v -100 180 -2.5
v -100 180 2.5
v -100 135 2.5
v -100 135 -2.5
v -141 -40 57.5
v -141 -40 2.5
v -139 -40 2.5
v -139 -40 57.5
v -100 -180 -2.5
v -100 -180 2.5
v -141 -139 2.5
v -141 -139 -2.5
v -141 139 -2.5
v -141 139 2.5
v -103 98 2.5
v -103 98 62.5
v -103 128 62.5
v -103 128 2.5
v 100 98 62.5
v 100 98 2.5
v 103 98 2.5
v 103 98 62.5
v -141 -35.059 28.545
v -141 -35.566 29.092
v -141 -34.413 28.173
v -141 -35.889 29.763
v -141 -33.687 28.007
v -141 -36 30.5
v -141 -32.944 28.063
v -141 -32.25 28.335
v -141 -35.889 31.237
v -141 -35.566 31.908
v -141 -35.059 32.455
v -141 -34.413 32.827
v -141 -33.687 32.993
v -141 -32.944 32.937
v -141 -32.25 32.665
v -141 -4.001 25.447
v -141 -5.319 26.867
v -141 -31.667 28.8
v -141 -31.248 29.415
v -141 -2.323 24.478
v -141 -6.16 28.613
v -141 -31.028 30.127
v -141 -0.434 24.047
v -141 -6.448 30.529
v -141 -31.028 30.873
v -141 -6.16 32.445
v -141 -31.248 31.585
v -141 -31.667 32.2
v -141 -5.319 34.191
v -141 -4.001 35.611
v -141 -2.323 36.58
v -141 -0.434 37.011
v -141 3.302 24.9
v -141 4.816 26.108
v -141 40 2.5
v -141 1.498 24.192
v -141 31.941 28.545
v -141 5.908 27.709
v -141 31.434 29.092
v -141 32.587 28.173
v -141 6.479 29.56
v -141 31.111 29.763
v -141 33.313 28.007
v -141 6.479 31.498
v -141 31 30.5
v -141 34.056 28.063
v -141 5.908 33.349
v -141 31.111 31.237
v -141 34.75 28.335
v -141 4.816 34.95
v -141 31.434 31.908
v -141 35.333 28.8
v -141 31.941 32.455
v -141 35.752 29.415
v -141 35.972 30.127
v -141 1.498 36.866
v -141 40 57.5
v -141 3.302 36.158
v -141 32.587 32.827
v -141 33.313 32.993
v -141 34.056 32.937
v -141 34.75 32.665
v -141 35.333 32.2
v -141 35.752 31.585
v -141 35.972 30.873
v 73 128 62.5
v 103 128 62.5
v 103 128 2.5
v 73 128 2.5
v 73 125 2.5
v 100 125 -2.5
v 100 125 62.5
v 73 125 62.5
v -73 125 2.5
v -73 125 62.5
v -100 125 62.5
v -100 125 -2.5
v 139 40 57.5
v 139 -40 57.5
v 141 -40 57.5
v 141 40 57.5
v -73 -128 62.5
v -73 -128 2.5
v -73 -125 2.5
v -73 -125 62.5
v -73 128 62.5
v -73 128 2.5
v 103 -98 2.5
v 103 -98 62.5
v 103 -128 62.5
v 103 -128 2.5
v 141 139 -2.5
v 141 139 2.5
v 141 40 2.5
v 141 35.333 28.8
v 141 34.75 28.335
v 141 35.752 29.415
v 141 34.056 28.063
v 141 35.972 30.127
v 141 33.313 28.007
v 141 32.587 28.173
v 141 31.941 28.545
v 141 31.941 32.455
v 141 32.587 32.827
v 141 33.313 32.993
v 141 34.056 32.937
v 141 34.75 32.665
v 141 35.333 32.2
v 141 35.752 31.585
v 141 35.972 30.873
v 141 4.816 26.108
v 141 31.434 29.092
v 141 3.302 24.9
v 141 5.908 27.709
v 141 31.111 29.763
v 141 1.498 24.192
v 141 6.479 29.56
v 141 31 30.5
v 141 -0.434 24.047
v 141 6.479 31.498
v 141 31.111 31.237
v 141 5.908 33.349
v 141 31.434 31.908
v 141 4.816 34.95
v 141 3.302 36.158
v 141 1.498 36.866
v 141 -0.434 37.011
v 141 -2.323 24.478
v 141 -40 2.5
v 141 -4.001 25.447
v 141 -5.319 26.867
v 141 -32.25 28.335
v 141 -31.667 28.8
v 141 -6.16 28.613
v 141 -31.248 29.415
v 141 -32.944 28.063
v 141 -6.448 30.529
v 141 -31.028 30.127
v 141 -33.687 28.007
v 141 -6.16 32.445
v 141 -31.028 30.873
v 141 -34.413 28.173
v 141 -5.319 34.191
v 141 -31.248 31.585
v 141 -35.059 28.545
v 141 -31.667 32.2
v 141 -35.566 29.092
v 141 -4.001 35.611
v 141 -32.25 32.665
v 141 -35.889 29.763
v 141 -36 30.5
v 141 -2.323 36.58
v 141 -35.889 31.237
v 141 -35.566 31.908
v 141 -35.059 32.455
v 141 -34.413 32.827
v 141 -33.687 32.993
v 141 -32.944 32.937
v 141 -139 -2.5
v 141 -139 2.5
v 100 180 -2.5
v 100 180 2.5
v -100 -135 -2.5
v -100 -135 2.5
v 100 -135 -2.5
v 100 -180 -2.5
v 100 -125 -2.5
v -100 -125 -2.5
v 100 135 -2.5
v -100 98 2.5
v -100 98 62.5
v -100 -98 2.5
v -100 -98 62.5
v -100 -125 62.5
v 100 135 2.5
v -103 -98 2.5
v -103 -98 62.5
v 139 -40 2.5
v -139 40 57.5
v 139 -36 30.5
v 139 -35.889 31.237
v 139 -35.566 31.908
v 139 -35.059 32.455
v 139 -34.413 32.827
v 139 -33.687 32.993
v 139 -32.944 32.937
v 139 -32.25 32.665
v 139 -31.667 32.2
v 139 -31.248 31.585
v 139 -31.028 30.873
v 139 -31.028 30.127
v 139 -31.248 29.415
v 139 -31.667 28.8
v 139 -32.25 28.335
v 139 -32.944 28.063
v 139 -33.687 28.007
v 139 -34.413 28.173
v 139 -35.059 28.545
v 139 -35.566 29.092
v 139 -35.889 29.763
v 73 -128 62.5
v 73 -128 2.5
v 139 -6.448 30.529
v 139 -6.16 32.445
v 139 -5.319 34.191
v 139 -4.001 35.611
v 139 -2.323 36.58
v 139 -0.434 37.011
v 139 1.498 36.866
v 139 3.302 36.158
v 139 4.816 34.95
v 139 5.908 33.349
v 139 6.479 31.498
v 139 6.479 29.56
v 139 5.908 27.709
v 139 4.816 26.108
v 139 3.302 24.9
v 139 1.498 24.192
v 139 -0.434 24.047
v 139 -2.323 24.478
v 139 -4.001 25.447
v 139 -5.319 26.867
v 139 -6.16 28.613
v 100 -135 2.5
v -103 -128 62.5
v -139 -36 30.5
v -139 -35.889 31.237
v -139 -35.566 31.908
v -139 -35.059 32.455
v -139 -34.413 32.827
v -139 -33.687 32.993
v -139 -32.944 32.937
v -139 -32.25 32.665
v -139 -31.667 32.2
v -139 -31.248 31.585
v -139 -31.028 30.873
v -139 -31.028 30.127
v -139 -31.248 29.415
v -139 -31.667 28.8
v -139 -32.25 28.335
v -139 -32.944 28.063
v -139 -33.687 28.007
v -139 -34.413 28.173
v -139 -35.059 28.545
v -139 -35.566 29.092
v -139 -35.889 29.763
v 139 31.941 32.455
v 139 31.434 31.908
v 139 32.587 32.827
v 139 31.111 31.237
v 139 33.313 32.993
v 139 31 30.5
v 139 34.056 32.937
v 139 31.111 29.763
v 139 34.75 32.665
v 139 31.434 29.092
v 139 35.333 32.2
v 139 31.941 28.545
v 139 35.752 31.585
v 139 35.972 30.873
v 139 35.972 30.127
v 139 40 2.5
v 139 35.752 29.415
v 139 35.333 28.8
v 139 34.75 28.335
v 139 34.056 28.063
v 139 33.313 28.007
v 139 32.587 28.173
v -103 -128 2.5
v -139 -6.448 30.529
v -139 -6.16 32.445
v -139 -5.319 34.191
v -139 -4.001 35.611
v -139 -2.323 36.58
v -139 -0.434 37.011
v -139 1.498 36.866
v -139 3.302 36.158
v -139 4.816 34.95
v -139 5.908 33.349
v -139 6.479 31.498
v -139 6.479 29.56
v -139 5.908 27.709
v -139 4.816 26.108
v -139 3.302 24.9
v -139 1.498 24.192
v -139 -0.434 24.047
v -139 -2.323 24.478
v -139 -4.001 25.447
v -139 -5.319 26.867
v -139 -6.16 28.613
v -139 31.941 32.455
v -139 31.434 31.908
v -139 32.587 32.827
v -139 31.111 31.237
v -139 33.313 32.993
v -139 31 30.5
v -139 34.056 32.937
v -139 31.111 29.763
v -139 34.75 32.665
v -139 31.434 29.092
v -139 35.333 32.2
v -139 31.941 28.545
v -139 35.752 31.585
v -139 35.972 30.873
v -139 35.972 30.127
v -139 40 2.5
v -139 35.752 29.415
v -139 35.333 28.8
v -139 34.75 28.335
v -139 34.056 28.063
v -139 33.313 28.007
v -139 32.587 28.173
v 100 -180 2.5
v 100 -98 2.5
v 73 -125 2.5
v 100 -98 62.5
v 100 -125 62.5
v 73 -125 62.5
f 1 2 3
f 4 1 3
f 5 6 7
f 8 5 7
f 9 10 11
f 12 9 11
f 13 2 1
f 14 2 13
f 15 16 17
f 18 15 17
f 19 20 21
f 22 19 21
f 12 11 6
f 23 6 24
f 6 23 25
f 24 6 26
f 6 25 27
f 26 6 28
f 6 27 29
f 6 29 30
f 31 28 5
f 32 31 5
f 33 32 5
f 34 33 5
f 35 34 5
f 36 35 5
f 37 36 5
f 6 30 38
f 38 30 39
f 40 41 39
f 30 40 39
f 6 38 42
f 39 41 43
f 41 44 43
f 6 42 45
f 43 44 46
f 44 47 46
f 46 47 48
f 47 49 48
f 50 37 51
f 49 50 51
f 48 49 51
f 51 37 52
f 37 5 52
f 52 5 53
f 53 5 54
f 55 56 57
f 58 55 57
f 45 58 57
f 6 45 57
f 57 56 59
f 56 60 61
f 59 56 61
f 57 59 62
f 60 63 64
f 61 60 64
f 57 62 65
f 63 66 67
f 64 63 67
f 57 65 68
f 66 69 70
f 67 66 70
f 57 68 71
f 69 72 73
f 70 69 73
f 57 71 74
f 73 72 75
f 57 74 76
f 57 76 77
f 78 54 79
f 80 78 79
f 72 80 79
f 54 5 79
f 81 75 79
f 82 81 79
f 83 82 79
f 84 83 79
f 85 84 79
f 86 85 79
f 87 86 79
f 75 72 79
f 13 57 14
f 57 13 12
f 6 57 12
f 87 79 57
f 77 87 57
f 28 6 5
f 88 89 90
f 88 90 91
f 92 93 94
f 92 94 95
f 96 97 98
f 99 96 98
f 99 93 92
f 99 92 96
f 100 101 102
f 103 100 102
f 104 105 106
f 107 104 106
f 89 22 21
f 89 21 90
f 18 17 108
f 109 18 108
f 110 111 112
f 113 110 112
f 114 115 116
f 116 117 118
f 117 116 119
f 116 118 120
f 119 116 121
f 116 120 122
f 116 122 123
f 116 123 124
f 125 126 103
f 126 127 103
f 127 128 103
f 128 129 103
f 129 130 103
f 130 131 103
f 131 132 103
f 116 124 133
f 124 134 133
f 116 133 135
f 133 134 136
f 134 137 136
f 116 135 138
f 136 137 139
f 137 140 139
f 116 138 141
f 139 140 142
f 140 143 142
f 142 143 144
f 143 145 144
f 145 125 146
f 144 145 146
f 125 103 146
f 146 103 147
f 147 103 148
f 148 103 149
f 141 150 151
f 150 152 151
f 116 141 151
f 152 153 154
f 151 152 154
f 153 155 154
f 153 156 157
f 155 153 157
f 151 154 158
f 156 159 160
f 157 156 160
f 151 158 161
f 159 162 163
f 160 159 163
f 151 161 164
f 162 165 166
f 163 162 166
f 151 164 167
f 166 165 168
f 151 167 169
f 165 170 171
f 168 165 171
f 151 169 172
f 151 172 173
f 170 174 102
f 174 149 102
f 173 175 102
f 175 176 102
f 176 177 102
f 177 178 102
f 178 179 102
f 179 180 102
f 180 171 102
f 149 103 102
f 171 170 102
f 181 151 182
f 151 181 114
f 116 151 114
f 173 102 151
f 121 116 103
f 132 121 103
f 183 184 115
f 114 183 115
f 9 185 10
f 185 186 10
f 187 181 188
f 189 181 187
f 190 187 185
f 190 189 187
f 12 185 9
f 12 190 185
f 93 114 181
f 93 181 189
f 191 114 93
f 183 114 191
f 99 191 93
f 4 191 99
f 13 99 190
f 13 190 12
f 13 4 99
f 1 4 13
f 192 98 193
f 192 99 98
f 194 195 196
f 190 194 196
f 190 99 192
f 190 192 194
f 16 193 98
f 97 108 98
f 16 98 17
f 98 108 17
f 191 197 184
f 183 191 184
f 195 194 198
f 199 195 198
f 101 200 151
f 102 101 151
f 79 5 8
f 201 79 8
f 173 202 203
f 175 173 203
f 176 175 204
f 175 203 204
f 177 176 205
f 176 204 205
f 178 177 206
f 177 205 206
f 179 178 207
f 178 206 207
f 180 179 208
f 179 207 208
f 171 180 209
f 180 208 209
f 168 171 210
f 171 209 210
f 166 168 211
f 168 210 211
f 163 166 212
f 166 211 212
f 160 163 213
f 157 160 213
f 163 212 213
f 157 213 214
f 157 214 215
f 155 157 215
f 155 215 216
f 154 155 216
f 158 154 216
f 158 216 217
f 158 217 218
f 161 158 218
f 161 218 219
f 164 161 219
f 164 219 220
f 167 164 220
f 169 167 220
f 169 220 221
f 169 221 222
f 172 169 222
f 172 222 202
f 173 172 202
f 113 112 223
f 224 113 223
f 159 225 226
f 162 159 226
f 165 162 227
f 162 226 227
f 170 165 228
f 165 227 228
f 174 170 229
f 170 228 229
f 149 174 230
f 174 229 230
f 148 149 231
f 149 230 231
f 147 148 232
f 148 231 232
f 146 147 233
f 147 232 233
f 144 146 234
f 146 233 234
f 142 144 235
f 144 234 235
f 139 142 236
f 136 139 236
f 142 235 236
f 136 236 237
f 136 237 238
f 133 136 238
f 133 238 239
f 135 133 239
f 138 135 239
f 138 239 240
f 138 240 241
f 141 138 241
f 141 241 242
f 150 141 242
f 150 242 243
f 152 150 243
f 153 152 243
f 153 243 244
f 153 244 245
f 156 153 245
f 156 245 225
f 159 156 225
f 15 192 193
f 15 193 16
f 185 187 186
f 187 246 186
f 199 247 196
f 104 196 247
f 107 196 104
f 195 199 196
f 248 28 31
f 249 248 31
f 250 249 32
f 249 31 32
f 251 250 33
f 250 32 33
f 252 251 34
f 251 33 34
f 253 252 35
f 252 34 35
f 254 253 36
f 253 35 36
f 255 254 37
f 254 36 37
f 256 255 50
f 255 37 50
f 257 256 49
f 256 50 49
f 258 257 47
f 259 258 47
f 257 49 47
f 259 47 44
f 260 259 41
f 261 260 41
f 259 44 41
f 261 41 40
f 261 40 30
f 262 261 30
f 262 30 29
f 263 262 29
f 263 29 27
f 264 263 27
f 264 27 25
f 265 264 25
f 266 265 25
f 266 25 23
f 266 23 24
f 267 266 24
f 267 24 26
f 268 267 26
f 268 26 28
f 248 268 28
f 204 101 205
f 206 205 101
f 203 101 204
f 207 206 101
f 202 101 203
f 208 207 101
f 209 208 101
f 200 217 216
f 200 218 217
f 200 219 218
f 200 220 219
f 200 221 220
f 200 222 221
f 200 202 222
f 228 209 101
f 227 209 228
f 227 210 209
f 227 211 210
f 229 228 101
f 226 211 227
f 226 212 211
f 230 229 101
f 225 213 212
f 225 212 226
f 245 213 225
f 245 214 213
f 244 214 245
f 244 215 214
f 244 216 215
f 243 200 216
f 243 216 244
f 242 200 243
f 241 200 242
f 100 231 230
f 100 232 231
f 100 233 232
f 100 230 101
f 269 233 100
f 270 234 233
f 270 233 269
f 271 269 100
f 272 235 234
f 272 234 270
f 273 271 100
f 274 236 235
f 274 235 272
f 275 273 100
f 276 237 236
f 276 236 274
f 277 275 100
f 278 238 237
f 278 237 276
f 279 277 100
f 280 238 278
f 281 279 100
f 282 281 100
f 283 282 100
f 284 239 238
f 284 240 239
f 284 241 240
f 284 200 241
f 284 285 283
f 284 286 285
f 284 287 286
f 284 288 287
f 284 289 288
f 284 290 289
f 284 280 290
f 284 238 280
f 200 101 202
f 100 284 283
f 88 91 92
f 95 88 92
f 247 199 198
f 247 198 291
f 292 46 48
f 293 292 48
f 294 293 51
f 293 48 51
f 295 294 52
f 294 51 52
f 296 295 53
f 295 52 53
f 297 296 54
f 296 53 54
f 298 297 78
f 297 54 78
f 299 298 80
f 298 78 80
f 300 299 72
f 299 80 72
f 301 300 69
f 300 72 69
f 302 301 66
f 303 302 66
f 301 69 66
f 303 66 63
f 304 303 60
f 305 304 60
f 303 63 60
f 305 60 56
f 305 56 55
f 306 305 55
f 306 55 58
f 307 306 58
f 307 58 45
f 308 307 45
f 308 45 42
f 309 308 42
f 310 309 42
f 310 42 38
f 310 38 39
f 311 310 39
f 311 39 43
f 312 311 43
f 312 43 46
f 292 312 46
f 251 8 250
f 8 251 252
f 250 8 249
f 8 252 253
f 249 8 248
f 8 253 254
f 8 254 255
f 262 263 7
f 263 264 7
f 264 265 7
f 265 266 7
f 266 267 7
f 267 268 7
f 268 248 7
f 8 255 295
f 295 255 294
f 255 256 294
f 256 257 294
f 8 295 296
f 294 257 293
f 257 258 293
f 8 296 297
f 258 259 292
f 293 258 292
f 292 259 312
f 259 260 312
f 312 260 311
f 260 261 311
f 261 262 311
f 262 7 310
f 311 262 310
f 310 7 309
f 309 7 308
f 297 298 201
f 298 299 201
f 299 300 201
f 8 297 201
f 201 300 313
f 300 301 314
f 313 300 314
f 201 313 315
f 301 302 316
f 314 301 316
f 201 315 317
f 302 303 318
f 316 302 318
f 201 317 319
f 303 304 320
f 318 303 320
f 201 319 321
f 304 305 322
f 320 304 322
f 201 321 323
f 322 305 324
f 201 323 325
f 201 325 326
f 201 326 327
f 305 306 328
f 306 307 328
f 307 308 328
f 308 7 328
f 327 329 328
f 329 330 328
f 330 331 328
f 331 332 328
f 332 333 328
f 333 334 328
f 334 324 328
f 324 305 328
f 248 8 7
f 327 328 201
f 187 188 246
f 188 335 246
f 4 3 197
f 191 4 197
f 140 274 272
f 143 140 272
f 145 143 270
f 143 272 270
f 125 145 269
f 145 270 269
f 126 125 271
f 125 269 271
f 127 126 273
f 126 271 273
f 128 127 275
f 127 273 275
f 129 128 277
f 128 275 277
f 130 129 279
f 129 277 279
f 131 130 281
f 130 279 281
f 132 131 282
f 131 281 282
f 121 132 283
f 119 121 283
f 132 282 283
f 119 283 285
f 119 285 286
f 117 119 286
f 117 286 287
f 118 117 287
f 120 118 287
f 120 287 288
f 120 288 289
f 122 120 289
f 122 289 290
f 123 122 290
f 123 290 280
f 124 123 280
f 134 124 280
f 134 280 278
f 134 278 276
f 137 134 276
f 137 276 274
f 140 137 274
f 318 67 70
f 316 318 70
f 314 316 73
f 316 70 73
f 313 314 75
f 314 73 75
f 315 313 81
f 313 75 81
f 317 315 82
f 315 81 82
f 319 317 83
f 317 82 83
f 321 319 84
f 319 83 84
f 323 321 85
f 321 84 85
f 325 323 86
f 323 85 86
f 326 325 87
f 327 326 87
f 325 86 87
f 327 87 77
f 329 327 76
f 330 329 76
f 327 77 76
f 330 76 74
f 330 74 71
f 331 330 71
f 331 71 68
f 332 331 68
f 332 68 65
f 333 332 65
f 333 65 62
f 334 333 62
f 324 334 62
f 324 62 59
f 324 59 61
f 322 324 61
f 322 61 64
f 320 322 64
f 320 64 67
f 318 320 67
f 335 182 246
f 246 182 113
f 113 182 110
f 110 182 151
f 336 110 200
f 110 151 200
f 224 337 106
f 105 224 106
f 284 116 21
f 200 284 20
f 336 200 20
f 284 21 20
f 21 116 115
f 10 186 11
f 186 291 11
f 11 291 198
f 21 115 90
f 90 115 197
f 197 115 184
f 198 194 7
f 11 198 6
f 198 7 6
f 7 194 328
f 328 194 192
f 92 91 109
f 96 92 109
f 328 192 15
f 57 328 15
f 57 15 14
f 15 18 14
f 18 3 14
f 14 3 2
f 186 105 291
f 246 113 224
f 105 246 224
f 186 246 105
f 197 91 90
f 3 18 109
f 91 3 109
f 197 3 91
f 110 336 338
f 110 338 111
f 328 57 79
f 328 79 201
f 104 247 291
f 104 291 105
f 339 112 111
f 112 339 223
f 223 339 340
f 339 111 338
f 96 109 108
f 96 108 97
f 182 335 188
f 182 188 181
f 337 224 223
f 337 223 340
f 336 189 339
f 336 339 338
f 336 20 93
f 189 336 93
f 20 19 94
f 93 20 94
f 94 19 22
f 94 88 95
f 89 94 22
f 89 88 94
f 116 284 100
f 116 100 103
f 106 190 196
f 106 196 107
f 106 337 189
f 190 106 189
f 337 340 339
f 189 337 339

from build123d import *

# Parameters (mm, degrees)
SKETCH_W        = 200
SKETCH_H        = 250
PAD_DEPTH       = 2.5
SKETCH001_W     = 2
SKETCH001_H     = 80
PAD001_DEPTH    = 55
SKETCH002_R     = 2.5
SKETCH002_R_2   = 6.5
POCKET_DEPTH    = 282.001
PAD002_DEPTH    = 60
POCKET001_DEPTH = 5.001


with BuildPart() as part:
    # Sketch → Pad (new body, symmetric)
    with BuildSketch(Plane.XY):
        Polygon((100, 180), (141, 180), (141, -180), (100, -180), (100, -135), (-100, -135), (-100, -180), (-141, -180), (-141, 180), (-100, 180), (-100, 135), (100, 135), align=None)
        Rectangle(SKETCH_W, SKETCH_H, mode=Mode.SUBTRACT)
    extrude(amount=PAD_DEPTH, both=True)

    # Sketch001 → Pad001 (new body)
    with BuildSketch(Plane.XY.offset(2.5)):
        with Locations((-140, 0)):
            Rectangle(SKETCH001_W, SKETCH001_H)
        with Locations((140, 0)):
            Rectangle(SKETCH001_W, SKETCH001_H)
    extrude(amount=PAD001_DEPTH)

    # Sketch002 → Pocket (cut, through all)
    with BuildSketch(Plane(origin=(-141, 0, 0), x_dir=(0, -1, 0), z_dir=(-1, 0, 0))):
        with Locations((-33.5, 30.5)):
            Circle(SKETCH002_R)
        with Locations((33.5, 30.5)):
            Circle(SKETCH002_R)
        with Locations((-0.051525, 30.52907)):
            Circle(SKETCH002_R_2)
    extrude(amount=-POCKET_DEPTH, mode=Mode.SUBTRACT)

    # Sketch003 → Pad002 (new body)
    with BuildSketch(Plane.XY.offset(2.5)):
        Polygon((-100, 98), (-103, 98), (-103, 128), (-73, 128), (-73, 125), (-100, 125), align=None)
        Polygon((73, 125), (100, 125), (100, 98), (103, 98), (103, 128), (73, 128), align=None)
        Polygon((-73, -125), (-100, -125), (-100, -98), (-103, -98), (-103, -128), (-73, -128), align=None)
        Polygon((73, -125), (100, -125), (100, -98), (103, -98), (103, -128), (73, -128), align=None)
    extrude(amount=PAD002_DEPTH)

    # Sketch004 → Pocket001 (cut, through all)
    with BuildSketch(Plane.XY.offset(2.5)):
        Polygon((-100, 180), (-154.538937, 125.461063), (-154.538937, 180), align=None)
        Polygon((100, 180), (154.538937, 125.461063), (154.538937, 180), align=None)
        Polygon((-100, -180), (-154.538937, -125.461063), (-154.538937, -180), align=None)
        Polygon((100, -180), (154.538937, -125.461063), (154.538937, -180), align=None)
    extrude(amount=-POCKET001_DEPTH, mode=Mode.SUBTRACT)


solid = part.part
